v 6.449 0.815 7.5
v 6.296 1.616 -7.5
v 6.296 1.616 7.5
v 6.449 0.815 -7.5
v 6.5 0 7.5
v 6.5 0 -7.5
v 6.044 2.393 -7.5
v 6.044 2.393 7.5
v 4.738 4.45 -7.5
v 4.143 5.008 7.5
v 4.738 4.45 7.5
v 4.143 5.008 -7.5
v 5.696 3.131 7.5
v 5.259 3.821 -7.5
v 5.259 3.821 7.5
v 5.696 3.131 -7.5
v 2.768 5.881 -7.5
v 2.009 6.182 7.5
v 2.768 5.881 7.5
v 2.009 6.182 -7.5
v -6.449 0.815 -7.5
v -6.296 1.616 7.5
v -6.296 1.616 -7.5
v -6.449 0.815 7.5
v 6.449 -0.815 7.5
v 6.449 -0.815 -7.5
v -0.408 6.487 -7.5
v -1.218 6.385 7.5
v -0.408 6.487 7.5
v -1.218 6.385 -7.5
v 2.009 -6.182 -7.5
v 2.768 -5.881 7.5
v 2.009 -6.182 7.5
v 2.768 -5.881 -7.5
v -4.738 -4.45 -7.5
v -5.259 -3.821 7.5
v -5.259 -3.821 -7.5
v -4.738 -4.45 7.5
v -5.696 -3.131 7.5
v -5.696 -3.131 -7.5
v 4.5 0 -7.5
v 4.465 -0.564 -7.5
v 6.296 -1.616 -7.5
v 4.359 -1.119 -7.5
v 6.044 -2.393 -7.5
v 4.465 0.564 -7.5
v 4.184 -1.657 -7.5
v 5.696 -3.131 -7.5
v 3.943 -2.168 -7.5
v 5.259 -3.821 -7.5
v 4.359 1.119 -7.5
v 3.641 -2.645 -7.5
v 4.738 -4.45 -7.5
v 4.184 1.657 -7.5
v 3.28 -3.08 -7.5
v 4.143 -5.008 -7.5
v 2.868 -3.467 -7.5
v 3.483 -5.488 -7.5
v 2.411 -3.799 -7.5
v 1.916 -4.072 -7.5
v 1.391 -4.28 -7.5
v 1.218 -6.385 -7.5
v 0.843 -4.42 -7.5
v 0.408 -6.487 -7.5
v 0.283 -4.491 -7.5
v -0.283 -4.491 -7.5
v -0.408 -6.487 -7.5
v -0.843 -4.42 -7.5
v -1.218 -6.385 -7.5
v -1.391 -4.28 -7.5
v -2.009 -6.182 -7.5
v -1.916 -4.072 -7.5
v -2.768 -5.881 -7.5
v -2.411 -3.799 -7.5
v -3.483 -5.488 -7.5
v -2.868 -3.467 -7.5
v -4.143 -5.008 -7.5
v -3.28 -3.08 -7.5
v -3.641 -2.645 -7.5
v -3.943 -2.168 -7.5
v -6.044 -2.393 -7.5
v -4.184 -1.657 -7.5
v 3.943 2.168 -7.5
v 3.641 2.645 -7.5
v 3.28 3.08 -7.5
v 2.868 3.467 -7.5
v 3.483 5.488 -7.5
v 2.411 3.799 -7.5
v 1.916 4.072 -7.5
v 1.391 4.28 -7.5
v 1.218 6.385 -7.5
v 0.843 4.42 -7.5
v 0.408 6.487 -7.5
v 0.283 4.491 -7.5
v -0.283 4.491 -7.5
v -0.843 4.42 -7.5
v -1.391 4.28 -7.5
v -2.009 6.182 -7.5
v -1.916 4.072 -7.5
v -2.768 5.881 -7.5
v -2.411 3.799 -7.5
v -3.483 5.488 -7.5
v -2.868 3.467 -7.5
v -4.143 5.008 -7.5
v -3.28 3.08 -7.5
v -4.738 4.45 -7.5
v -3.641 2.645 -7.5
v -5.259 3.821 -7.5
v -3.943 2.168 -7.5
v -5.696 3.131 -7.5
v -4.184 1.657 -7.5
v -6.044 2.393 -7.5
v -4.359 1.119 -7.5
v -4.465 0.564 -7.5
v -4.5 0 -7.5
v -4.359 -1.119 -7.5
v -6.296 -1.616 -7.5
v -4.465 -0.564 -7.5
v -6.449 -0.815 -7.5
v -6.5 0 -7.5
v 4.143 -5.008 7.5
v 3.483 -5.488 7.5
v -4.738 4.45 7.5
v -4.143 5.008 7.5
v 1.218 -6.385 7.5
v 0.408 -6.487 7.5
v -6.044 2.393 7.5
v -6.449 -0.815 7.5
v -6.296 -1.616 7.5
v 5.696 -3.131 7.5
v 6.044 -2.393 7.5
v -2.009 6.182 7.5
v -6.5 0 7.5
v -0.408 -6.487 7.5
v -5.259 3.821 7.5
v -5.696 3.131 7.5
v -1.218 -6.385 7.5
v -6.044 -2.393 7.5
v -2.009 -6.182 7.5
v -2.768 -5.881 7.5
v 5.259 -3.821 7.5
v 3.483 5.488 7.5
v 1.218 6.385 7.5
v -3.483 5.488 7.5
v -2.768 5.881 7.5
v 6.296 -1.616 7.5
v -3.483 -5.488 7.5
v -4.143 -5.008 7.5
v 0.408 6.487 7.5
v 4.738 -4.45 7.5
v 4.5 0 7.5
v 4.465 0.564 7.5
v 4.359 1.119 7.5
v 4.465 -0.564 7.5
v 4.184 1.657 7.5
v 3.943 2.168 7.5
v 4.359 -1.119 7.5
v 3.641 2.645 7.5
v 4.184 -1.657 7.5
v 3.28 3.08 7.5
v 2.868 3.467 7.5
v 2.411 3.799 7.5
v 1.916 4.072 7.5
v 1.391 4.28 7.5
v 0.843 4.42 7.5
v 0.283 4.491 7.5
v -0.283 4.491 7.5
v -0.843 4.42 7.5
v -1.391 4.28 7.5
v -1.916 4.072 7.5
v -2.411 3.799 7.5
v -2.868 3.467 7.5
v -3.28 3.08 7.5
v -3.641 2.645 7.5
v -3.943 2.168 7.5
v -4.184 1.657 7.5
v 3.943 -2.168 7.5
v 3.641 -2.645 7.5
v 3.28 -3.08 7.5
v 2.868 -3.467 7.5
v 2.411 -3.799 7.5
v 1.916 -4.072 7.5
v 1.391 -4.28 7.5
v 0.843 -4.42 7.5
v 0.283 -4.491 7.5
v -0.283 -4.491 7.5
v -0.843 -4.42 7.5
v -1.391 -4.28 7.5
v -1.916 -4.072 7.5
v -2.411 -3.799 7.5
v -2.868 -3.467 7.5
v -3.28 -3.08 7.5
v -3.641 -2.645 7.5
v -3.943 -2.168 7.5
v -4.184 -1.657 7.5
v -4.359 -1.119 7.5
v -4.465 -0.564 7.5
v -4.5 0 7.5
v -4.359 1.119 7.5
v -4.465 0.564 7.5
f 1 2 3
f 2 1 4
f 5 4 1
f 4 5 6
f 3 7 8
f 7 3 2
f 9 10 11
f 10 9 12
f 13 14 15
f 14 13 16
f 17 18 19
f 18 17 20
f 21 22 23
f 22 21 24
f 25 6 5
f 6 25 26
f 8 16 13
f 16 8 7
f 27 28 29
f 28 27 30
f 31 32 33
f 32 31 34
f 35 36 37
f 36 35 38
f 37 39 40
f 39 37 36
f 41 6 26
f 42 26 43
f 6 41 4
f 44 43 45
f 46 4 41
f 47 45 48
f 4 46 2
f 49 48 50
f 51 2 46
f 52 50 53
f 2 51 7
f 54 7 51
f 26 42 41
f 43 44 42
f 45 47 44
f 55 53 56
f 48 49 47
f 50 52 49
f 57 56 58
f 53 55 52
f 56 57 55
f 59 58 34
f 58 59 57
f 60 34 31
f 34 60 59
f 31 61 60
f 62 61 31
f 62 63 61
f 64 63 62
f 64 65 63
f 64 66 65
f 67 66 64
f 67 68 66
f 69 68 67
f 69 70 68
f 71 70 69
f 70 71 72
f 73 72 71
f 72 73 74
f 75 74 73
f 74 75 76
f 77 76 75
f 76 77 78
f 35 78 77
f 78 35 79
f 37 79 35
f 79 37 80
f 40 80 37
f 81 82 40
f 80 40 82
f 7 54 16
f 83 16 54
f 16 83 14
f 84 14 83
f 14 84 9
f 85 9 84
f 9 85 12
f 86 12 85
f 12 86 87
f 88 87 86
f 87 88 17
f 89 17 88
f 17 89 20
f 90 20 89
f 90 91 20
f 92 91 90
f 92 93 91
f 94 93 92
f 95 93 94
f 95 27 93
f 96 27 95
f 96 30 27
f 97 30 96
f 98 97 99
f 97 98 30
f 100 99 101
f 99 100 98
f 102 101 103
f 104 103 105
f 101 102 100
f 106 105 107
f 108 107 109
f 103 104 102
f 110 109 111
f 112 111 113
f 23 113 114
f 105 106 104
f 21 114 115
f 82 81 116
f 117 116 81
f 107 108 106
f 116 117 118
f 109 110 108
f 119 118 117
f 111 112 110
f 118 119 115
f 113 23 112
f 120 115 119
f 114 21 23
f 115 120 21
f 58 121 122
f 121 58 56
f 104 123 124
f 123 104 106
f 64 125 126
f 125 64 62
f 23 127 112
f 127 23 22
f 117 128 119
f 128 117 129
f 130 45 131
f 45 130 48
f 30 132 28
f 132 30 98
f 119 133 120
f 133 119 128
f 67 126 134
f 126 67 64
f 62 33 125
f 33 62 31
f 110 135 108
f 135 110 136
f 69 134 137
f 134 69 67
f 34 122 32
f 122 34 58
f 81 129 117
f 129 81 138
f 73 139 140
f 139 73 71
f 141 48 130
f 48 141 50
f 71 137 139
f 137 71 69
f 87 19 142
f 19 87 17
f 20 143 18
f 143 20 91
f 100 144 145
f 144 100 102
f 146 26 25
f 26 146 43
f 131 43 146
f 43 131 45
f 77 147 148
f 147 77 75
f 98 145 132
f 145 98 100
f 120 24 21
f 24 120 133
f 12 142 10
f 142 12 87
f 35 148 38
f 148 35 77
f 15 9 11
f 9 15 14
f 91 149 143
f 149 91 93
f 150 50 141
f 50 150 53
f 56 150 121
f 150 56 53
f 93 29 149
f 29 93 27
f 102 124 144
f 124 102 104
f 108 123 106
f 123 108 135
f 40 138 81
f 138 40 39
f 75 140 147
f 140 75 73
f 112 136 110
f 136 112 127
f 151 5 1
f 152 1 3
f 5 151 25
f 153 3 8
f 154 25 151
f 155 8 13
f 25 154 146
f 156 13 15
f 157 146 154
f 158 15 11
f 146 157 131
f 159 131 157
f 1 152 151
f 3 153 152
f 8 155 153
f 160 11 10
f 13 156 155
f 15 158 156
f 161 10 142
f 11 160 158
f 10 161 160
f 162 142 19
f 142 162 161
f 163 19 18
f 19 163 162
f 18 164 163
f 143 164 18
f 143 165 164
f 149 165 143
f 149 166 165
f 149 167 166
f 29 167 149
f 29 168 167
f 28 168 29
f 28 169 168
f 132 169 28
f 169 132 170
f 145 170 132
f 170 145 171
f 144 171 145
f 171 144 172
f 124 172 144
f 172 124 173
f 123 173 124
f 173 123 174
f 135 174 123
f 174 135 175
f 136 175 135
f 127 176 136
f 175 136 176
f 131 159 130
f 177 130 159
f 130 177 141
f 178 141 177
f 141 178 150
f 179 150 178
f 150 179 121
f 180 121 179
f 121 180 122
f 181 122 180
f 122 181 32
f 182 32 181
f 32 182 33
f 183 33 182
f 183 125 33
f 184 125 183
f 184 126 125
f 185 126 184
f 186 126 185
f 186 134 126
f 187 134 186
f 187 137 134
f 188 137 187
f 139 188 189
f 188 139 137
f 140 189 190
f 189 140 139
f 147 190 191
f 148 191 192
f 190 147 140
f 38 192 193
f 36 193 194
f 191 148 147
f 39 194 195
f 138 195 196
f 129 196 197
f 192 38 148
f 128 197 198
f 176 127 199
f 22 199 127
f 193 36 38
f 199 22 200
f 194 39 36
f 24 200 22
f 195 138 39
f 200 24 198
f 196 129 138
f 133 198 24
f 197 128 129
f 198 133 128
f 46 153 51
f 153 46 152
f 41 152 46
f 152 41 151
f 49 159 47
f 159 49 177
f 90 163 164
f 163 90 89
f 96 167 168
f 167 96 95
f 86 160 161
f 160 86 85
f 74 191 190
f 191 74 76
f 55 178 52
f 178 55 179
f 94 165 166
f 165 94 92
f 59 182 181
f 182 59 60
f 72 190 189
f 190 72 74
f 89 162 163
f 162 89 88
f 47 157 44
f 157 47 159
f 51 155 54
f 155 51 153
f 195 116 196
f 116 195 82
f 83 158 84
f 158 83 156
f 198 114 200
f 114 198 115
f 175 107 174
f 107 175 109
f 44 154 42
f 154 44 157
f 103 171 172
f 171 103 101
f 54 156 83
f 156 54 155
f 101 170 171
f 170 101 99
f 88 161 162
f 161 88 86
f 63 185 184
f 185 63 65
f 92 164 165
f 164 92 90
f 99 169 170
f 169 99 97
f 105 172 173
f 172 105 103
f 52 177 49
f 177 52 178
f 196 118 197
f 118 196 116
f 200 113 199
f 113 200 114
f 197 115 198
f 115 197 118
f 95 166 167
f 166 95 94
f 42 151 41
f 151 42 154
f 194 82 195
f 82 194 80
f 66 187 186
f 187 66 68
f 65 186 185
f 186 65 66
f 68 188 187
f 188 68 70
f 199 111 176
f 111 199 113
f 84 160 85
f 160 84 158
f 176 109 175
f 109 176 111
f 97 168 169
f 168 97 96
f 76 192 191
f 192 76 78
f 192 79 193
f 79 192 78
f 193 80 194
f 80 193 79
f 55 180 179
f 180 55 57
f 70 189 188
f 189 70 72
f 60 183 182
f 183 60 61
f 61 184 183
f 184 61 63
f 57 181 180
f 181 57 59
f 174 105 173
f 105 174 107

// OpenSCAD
$fn = 50;


difference() {
	union() {
		translate(v = [0, 0, -7.5000000000]) {
			cylinder(h = 15, r = 6.5000000000);
		}
	}
	union() {
		translate(v = [0, 0, -100.0000000000]) {
			cylinder(h = 200, r = 4.5000000000);
		}
	}
}
